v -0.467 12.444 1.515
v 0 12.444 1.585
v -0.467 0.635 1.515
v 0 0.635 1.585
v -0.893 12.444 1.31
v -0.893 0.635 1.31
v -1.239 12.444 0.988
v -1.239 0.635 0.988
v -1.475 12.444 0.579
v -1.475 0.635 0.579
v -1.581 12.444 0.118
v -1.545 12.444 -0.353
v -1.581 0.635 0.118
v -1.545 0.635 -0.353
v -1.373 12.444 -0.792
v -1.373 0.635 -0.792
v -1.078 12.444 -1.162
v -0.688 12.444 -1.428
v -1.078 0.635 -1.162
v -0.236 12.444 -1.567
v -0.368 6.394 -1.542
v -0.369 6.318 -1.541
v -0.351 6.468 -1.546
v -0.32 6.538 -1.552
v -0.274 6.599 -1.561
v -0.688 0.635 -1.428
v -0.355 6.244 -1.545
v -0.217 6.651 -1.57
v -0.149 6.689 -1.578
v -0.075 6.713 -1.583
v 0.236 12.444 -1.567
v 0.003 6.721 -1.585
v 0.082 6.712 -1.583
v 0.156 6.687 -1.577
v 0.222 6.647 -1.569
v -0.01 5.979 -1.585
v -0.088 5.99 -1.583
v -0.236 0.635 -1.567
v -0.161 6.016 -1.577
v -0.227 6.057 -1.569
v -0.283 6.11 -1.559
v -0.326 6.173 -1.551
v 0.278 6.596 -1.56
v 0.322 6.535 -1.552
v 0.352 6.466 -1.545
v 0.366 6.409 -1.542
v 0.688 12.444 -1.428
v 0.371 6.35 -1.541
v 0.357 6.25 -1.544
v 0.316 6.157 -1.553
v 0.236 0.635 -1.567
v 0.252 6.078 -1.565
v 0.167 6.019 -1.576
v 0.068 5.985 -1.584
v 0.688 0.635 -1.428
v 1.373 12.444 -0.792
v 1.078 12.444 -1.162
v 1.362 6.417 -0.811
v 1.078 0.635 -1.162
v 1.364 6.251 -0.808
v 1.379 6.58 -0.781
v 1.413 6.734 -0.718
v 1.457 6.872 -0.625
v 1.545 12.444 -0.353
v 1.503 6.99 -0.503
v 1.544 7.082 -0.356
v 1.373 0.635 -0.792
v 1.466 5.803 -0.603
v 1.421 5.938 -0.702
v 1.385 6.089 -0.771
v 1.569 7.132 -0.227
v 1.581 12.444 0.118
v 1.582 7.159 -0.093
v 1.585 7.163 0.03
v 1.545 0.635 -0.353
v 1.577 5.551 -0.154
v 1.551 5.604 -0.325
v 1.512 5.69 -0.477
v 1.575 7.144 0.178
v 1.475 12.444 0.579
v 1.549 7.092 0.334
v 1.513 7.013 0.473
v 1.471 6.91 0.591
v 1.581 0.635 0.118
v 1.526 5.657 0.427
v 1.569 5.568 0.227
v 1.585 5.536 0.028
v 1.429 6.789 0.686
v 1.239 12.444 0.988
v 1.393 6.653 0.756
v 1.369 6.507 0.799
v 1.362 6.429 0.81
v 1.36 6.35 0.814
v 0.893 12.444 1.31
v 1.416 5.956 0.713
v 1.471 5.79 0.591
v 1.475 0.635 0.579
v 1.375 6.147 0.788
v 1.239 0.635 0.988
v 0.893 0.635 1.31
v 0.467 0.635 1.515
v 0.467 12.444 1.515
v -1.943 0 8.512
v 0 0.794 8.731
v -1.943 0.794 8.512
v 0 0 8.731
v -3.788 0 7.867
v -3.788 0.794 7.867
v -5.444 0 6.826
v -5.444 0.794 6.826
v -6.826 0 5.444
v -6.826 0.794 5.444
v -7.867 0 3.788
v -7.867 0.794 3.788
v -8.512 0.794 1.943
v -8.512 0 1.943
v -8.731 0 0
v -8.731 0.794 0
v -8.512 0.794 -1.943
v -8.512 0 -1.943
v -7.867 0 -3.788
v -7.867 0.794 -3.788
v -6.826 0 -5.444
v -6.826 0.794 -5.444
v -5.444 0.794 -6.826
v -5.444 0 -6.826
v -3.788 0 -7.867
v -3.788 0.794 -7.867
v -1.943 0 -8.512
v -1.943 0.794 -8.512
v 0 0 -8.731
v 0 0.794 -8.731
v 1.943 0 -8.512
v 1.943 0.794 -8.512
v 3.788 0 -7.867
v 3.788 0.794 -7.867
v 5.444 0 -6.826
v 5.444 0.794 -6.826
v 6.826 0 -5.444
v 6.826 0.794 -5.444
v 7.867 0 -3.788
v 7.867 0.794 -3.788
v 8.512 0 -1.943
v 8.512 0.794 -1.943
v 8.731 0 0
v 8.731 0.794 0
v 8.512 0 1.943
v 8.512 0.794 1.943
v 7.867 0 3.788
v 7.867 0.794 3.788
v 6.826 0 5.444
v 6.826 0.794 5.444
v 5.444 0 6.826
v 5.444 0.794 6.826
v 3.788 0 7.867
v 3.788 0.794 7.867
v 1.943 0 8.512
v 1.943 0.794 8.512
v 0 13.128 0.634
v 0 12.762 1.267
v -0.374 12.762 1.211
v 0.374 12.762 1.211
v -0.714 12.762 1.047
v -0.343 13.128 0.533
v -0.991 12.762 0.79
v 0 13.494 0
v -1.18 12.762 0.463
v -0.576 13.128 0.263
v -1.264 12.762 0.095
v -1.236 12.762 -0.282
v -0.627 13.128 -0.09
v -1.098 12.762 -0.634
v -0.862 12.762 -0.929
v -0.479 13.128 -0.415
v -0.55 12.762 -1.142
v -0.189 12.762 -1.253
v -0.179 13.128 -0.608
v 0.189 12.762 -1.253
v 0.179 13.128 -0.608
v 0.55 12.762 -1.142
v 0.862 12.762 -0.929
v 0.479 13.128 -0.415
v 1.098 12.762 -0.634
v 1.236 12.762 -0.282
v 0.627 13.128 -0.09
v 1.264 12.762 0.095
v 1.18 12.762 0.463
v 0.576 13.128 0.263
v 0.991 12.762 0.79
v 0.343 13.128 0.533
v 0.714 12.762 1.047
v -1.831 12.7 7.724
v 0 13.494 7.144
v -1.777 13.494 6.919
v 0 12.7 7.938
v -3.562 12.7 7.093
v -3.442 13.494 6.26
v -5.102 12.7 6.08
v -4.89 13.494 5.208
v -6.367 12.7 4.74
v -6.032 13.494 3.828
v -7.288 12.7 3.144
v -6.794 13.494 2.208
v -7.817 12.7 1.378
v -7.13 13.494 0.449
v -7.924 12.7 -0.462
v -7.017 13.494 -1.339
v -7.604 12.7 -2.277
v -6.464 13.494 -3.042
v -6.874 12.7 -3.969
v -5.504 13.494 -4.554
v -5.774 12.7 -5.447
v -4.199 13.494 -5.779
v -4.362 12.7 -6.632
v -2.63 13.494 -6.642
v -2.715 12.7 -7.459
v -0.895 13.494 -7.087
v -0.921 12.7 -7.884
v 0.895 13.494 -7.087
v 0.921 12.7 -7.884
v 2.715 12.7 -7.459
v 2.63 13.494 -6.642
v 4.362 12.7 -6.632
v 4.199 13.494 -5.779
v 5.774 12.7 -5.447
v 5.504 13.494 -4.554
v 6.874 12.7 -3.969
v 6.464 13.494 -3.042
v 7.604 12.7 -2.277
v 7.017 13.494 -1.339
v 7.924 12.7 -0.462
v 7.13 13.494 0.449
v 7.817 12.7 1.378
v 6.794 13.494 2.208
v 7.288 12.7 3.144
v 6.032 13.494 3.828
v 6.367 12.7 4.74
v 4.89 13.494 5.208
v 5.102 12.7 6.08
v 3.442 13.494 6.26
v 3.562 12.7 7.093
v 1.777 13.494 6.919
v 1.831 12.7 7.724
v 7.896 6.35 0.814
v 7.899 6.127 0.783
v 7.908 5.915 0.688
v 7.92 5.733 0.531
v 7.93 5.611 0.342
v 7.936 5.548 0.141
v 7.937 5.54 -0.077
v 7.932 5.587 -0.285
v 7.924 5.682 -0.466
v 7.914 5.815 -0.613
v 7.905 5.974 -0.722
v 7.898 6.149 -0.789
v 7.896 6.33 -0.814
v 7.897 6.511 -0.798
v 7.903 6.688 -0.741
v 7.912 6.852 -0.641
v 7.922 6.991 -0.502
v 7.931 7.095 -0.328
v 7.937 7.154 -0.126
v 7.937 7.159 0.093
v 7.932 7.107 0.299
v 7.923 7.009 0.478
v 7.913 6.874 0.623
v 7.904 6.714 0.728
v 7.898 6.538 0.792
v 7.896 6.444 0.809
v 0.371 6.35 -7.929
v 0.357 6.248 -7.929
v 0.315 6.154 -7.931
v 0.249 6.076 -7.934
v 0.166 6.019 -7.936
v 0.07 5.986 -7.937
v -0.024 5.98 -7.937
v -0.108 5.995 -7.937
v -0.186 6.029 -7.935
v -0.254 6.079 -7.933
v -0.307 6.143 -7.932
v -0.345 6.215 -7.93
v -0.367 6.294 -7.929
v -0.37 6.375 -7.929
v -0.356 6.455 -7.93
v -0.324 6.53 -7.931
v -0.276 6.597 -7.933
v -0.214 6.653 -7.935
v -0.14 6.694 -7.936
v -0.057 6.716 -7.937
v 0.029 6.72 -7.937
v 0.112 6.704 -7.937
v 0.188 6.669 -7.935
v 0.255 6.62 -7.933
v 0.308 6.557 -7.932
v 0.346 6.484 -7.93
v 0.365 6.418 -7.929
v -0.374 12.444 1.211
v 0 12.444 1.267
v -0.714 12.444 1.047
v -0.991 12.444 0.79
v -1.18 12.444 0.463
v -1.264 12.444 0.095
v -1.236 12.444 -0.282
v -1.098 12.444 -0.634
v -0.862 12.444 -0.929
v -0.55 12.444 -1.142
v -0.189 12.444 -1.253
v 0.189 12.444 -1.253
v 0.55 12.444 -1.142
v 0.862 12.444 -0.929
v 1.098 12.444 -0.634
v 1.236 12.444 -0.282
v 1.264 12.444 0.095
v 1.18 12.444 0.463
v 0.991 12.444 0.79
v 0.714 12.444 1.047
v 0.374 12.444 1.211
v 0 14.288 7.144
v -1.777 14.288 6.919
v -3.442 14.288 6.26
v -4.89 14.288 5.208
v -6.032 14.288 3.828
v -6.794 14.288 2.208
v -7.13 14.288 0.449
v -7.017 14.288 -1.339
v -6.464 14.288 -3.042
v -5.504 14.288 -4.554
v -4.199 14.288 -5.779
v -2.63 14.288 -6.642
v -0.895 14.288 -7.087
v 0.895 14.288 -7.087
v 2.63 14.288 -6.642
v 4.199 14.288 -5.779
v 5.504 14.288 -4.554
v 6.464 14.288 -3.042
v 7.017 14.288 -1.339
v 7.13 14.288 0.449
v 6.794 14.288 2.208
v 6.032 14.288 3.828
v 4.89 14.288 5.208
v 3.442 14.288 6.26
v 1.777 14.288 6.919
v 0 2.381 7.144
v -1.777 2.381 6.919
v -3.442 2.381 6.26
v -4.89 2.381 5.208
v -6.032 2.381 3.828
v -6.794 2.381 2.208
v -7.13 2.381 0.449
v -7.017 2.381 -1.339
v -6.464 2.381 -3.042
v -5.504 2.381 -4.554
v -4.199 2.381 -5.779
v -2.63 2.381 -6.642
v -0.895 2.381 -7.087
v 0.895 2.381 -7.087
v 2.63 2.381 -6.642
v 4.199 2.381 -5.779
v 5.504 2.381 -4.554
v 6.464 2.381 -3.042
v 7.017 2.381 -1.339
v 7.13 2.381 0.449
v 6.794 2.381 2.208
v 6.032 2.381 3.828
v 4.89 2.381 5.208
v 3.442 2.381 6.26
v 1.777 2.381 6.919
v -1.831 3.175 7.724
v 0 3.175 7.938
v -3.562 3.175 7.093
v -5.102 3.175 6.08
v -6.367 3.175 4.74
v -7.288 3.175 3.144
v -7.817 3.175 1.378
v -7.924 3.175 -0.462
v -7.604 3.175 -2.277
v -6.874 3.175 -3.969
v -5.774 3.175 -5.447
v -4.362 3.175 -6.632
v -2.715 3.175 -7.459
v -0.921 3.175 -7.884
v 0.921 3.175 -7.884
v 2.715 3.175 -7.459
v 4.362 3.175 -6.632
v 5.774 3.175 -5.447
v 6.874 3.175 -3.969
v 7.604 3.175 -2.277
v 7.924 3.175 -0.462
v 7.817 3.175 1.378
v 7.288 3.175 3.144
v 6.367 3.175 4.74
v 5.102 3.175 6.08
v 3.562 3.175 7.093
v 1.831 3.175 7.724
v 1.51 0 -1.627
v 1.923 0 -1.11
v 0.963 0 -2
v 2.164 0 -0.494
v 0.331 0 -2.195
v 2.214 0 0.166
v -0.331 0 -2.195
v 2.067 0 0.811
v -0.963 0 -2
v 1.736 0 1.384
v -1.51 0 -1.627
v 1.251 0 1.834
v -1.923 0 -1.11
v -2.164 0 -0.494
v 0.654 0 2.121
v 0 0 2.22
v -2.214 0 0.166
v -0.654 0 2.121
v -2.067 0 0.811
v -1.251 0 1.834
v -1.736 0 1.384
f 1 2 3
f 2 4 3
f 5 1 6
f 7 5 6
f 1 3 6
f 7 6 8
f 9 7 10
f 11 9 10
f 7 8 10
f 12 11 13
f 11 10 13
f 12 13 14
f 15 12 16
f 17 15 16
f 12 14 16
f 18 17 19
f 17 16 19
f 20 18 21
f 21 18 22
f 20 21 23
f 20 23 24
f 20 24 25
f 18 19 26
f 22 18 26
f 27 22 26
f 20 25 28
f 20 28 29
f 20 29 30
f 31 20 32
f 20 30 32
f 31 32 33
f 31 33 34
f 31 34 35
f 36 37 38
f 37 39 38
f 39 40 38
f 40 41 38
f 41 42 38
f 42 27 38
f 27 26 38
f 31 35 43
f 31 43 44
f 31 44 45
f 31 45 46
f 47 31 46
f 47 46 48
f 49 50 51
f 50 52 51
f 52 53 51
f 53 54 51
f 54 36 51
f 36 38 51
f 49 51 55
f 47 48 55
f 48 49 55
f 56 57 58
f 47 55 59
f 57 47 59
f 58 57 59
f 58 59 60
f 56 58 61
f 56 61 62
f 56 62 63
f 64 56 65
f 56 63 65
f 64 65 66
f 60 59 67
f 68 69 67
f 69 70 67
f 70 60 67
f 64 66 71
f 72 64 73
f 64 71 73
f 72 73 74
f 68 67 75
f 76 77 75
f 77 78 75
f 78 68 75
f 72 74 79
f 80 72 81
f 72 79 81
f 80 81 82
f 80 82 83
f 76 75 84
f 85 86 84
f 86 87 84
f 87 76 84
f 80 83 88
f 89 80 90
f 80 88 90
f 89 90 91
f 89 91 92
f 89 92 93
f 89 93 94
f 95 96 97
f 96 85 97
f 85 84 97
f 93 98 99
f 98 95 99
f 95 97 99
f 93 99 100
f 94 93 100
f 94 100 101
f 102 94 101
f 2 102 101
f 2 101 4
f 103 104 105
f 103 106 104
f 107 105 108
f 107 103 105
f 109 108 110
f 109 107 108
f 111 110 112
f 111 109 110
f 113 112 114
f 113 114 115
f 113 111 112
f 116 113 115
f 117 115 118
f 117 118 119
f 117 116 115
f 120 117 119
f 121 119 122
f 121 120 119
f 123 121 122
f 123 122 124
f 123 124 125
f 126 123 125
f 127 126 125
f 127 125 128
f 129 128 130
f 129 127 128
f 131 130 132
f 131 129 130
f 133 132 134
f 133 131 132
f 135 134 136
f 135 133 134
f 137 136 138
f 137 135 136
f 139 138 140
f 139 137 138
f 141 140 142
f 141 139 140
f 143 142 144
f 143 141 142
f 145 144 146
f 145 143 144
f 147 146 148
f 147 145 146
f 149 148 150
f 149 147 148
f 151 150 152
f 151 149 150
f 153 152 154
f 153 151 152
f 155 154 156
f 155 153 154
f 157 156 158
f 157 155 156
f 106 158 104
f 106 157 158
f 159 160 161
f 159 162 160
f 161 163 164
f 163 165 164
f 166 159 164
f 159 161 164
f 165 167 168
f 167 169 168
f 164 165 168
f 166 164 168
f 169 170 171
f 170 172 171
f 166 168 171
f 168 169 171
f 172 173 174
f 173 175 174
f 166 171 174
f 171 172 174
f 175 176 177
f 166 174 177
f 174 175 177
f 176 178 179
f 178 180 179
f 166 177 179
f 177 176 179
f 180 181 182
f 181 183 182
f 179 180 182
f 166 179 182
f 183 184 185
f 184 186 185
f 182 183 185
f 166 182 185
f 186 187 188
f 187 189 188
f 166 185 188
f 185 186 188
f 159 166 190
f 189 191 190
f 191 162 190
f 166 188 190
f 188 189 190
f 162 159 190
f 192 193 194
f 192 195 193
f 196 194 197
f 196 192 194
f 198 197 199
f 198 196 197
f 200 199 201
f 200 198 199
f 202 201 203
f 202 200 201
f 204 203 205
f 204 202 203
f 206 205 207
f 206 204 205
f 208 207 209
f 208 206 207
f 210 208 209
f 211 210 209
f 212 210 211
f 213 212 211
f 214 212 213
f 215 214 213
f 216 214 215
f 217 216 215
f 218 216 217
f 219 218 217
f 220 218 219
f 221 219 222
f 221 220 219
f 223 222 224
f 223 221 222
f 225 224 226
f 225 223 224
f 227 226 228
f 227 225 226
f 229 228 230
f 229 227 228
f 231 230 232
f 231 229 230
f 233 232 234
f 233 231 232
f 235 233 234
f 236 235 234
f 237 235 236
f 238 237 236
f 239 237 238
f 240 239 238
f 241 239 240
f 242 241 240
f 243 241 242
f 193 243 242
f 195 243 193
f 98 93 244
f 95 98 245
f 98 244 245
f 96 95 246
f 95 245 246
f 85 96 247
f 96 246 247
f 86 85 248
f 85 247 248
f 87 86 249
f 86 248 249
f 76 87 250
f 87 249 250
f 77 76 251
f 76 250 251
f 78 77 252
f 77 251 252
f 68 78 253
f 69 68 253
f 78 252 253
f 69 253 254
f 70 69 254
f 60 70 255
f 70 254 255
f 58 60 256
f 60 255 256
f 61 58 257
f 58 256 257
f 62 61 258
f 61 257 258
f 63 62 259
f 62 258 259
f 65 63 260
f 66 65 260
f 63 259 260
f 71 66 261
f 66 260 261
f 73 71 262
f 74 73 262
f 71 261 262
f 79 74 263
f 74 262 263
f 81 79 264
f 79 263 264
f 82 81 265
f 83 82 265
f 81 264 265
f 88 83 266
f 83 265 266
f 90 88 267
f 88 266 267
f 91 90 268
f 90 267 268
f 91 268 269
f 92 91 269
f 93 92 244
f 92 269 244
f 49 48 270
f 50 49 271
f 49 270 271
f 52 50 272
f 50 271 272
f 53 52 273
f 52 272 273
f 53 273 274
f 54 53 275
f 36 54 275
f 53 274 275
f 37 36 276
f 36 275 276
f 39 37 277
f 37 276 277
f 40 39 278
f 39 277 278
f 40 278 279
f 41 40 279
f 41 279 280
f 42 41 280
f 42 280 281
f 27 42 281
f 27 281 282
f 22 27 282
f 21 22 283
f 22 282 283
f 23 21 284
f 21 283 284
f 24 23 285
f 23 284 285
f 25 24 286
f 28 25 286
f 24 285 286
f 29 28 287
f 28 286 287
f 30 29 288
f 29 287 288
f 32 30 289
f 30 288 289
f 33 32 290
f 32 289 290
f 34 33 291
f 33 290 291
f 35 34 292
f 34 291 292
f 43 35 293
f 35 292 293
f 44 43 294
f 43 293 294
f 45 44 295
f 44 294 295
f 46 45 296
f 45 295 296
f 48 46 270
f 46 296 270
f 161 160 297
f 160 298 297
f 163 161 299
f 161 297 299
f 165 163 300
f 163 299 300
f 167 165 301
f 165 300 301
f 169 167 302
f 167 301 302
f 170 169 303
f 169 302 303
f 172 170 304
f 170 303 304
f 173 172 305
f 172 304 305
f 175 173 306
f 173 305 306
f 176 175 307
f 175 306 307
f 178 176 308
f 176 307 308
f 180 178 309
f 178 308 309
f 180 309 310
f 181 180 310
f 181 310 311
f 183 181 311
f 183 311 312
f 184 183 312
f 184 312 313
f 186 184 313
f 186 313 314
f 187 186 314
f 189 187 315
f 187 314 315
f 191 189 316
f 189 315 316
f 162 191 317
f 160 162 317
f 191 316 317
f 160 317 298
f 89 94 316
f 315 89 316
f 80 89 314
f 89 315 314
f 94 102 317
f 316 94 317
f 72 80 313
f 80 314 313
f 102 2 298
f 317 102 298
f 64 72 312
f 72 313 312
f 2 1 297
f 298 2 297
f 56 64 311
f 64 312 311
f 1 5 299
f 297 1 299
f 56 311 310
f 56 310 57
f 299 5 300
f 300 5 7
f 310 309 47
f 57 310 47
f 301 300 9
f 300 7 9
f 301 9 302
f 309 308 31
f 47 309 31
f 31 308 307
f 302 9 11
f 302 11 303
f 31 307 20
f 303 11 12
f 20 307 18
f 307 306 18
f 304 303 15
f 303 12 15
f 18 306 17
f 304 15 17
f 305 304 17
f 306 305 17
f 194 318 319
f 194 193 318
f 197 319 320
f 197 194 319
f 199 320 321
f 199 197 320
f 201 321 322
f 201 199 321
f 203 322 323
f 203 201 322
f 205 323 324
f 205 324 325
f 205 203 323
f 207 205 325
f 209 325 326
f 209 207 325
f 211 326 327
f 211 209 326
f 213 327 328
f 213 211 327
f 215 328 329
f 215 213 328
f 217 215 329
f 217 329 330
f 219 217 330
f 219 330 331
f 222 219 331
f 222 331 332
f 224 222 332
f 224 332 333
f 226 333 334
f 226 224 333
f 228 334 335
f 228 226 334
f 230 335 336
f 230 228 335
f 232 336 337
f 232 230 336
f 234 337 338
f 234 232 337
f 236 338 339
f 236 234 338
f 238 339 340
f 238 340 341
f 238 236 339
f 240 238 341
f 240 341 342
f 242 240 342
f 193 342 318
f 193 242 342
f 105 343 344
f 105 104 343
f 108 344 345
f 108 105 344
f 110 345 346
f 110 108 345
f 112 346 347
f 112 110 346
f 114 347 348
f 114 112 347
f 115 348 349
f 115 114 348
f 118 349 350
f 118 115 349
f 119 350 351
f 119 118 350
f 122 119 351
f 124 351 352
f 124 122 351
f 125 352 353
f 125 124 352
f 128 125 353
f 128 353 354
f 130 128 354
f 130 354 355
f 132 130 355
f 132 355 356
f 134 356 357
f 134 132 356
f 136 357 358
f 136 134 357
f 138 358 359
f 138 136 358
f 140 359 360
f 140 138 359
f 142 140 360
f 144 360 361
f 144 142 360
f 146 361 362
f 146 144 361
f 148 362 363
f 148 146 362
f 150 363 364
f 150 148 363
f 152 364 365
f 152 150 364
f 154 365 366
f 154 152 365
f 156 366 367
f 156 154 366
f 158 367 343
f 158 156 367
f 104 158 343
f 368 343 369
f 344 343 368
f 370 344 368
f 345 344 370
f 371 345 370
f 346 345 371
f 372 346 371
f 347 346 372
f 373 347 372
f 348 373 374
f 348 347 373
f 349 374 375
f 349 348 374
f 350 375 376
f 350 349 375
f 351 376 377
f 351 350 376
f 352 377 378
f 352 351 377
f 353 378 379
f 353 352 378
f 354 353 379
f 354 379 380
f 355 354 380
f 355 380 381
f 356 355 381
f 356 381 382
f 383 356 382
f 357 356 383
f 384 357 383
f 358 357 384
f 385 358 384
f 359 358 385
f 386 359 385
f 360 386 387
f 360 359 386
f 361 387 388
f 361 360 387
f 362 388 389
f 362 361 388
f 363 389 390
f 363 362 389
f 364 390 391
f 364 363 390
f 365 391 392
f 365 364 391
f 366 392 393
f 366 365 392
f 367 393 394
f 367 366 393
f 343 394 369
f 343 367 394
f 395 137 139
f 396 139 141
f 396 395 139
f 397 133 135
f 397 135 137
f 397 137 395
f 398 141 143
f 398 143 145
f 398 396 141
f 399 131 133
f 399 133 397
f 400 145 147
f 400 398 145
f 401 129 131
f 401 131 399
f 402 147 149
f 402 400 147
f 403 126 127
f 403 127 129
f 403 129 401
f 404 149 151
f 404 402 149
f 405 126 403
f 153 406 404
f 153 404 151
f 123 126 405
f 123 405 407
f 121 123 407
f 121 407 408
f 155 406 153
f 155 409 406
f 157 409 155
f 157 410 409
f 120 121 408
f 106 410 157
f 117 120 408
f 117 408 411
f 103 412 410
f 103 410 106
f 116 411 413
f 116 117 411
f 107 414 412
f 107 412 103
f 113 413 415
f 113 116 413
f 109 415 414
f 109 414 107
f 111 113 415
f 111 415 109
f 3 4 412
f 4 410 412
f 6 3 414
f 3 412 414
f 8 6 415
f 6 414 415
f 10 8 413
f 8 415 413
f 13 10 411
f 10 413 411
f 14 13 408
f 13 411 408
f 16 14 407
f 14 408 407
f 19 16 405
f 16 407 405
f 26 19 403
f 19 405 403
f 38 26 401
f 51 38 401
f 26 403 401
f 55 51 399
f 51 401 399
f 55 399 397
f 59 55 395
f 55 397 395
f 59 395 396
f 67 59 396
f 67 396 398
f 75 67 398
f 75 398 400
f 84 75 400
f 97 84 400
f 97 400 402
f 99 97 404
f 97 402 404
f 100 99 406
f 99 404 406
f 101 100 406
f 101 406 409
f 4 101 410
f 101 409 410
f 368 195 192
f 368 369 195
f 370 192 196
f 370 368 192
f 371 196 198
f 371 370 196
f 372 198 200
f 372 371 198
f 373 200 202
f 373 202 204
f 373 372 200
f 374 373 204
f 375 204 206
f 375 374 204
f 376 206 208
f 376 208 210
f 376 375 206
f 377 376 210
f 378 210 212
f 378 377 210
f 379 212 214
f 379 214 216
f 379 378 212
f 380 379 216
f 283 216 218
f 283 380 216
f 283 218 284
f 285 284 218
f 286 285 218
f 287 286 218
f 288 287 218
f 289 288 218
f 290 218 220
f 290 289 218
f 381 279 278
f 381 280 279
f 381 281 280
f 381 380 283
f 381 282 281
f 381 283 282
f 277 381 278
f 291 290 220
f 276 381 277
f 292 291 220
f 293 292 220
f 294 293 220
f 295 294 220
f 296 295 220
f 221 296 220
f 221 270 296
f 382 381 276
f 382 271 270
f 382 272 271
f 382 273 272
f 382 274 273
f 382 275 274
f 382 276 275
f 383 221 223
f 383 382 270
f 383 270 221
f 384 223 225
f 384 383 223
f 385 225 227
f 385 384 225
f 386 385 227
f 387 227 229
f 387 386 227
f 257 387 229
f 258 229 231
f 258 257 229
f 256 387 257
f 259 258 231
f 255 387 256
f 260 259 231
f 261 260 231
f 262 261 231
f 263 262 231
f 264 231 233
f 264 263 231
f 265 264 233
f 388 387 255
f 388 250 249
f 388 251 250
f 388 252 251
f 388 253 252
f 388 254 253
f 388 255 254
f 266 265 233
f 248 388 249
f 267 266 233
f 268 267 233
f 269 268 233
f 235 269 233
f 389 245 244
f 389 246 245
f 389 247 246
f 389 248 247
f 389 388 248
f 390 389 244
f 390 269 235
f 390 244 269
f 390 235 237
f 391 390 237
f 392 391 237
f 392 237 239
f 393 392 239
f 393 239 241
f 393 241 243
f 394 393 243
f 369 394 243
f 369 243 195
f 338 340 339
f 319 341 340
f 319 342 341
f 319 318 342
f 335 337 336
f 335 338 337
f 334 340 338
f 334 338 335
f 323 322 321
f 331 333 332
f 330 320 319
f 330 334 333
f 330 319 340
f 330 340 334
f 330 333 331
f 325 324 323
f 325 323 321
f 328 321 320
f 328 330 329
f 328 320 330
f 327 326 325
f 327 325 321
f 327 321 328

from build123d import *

# Parameters (mm, degrees)
SKETCH2_W = 8.73125
SKETCH2_H = 0.81407
SKETCH3_W = 8.73125
SKETCH3_H = 0.37084


with BuildPart() as part:
    # Sketch1 → BODY (revolve)
    with BuildSketch(Plane.XY, mode=Mode.PRIVATE) as body_sk:
        Polygon((7.14375, 14.2875), (7.14375, 13.49375), (7.9375, 12.7), (7.9375, 3.175), (7.14375, 2.38125), (8.73125, 0.79375), (8.73125, 0), (0, 0), (0, 14.2875), align=None)
    revolve(body_sk.sketch.rotate(Axis((0, 17.35888354, 0), (0, -1, 0)), 90), axis=Axis((0, 17.35888354, 0), (0, -1, 0)))

    # Sketch6 → BORE-1 (revolve, cut)
    with BuildSketch(Plane.XY, mode=Mode.PRIVATE) as bore_1_sk:
        Polygon((0, 13.49375), (1.26746, 12.761981628), (1.26746, 12.444481628), (1.58496, 12.444481628), (1.58496, 0.635), (2.21996, 0), (0, 0), align=None)
    revolve(bore_1_sk.sketch.rotate(Axis((0, 13.952718453, 0), (0, -1, 0)), 90), axis=Axis((0, 13.952718453, 0), (0, -1, 0)), mode=Mode.SUBTRACT)

    # Sketch2 → SET SCREW (revolve, cut)
    with BuildSketch(Plane.XY, mode=Mode.PRIVATE) as set_screw_sk:
        with Locations((4.365625, 6.757035)):
            Rectangle(SKETCH2_W, SKETCH2_H)
    revolve(set_screw_sk.sketch.rotate(Axis((-2.248807984, 6.35, 0), (1, 0, 0)), 90), axis=Axis((-2.248807984, 6.35, 0), (1, 0, 0)), mode=Mode.SUBTRACT)

    # Sketch3 → SUB DRILL (revolve, cut)
    with BuildSketch(Plane(origin=(0, 0, 0), x_dir=(0, 0, -1), z_dir=(1, 0, 0)), mode=Mode.PRIVATE) as sub_drill_sk:
        with Locations((4.365625, 6.53542)):
            Rectangle(SKETCH3_W, SKETCH3_H)
    revolve(sub_drill_sk.sketch.rotate(Axis((0, 6.35, 0), (0, 0, -1)), 90), axis=Axis((0, 6.35, 0), (0, 0, -1)), mode=Mode.SUBTRACT)


solid = part.part
